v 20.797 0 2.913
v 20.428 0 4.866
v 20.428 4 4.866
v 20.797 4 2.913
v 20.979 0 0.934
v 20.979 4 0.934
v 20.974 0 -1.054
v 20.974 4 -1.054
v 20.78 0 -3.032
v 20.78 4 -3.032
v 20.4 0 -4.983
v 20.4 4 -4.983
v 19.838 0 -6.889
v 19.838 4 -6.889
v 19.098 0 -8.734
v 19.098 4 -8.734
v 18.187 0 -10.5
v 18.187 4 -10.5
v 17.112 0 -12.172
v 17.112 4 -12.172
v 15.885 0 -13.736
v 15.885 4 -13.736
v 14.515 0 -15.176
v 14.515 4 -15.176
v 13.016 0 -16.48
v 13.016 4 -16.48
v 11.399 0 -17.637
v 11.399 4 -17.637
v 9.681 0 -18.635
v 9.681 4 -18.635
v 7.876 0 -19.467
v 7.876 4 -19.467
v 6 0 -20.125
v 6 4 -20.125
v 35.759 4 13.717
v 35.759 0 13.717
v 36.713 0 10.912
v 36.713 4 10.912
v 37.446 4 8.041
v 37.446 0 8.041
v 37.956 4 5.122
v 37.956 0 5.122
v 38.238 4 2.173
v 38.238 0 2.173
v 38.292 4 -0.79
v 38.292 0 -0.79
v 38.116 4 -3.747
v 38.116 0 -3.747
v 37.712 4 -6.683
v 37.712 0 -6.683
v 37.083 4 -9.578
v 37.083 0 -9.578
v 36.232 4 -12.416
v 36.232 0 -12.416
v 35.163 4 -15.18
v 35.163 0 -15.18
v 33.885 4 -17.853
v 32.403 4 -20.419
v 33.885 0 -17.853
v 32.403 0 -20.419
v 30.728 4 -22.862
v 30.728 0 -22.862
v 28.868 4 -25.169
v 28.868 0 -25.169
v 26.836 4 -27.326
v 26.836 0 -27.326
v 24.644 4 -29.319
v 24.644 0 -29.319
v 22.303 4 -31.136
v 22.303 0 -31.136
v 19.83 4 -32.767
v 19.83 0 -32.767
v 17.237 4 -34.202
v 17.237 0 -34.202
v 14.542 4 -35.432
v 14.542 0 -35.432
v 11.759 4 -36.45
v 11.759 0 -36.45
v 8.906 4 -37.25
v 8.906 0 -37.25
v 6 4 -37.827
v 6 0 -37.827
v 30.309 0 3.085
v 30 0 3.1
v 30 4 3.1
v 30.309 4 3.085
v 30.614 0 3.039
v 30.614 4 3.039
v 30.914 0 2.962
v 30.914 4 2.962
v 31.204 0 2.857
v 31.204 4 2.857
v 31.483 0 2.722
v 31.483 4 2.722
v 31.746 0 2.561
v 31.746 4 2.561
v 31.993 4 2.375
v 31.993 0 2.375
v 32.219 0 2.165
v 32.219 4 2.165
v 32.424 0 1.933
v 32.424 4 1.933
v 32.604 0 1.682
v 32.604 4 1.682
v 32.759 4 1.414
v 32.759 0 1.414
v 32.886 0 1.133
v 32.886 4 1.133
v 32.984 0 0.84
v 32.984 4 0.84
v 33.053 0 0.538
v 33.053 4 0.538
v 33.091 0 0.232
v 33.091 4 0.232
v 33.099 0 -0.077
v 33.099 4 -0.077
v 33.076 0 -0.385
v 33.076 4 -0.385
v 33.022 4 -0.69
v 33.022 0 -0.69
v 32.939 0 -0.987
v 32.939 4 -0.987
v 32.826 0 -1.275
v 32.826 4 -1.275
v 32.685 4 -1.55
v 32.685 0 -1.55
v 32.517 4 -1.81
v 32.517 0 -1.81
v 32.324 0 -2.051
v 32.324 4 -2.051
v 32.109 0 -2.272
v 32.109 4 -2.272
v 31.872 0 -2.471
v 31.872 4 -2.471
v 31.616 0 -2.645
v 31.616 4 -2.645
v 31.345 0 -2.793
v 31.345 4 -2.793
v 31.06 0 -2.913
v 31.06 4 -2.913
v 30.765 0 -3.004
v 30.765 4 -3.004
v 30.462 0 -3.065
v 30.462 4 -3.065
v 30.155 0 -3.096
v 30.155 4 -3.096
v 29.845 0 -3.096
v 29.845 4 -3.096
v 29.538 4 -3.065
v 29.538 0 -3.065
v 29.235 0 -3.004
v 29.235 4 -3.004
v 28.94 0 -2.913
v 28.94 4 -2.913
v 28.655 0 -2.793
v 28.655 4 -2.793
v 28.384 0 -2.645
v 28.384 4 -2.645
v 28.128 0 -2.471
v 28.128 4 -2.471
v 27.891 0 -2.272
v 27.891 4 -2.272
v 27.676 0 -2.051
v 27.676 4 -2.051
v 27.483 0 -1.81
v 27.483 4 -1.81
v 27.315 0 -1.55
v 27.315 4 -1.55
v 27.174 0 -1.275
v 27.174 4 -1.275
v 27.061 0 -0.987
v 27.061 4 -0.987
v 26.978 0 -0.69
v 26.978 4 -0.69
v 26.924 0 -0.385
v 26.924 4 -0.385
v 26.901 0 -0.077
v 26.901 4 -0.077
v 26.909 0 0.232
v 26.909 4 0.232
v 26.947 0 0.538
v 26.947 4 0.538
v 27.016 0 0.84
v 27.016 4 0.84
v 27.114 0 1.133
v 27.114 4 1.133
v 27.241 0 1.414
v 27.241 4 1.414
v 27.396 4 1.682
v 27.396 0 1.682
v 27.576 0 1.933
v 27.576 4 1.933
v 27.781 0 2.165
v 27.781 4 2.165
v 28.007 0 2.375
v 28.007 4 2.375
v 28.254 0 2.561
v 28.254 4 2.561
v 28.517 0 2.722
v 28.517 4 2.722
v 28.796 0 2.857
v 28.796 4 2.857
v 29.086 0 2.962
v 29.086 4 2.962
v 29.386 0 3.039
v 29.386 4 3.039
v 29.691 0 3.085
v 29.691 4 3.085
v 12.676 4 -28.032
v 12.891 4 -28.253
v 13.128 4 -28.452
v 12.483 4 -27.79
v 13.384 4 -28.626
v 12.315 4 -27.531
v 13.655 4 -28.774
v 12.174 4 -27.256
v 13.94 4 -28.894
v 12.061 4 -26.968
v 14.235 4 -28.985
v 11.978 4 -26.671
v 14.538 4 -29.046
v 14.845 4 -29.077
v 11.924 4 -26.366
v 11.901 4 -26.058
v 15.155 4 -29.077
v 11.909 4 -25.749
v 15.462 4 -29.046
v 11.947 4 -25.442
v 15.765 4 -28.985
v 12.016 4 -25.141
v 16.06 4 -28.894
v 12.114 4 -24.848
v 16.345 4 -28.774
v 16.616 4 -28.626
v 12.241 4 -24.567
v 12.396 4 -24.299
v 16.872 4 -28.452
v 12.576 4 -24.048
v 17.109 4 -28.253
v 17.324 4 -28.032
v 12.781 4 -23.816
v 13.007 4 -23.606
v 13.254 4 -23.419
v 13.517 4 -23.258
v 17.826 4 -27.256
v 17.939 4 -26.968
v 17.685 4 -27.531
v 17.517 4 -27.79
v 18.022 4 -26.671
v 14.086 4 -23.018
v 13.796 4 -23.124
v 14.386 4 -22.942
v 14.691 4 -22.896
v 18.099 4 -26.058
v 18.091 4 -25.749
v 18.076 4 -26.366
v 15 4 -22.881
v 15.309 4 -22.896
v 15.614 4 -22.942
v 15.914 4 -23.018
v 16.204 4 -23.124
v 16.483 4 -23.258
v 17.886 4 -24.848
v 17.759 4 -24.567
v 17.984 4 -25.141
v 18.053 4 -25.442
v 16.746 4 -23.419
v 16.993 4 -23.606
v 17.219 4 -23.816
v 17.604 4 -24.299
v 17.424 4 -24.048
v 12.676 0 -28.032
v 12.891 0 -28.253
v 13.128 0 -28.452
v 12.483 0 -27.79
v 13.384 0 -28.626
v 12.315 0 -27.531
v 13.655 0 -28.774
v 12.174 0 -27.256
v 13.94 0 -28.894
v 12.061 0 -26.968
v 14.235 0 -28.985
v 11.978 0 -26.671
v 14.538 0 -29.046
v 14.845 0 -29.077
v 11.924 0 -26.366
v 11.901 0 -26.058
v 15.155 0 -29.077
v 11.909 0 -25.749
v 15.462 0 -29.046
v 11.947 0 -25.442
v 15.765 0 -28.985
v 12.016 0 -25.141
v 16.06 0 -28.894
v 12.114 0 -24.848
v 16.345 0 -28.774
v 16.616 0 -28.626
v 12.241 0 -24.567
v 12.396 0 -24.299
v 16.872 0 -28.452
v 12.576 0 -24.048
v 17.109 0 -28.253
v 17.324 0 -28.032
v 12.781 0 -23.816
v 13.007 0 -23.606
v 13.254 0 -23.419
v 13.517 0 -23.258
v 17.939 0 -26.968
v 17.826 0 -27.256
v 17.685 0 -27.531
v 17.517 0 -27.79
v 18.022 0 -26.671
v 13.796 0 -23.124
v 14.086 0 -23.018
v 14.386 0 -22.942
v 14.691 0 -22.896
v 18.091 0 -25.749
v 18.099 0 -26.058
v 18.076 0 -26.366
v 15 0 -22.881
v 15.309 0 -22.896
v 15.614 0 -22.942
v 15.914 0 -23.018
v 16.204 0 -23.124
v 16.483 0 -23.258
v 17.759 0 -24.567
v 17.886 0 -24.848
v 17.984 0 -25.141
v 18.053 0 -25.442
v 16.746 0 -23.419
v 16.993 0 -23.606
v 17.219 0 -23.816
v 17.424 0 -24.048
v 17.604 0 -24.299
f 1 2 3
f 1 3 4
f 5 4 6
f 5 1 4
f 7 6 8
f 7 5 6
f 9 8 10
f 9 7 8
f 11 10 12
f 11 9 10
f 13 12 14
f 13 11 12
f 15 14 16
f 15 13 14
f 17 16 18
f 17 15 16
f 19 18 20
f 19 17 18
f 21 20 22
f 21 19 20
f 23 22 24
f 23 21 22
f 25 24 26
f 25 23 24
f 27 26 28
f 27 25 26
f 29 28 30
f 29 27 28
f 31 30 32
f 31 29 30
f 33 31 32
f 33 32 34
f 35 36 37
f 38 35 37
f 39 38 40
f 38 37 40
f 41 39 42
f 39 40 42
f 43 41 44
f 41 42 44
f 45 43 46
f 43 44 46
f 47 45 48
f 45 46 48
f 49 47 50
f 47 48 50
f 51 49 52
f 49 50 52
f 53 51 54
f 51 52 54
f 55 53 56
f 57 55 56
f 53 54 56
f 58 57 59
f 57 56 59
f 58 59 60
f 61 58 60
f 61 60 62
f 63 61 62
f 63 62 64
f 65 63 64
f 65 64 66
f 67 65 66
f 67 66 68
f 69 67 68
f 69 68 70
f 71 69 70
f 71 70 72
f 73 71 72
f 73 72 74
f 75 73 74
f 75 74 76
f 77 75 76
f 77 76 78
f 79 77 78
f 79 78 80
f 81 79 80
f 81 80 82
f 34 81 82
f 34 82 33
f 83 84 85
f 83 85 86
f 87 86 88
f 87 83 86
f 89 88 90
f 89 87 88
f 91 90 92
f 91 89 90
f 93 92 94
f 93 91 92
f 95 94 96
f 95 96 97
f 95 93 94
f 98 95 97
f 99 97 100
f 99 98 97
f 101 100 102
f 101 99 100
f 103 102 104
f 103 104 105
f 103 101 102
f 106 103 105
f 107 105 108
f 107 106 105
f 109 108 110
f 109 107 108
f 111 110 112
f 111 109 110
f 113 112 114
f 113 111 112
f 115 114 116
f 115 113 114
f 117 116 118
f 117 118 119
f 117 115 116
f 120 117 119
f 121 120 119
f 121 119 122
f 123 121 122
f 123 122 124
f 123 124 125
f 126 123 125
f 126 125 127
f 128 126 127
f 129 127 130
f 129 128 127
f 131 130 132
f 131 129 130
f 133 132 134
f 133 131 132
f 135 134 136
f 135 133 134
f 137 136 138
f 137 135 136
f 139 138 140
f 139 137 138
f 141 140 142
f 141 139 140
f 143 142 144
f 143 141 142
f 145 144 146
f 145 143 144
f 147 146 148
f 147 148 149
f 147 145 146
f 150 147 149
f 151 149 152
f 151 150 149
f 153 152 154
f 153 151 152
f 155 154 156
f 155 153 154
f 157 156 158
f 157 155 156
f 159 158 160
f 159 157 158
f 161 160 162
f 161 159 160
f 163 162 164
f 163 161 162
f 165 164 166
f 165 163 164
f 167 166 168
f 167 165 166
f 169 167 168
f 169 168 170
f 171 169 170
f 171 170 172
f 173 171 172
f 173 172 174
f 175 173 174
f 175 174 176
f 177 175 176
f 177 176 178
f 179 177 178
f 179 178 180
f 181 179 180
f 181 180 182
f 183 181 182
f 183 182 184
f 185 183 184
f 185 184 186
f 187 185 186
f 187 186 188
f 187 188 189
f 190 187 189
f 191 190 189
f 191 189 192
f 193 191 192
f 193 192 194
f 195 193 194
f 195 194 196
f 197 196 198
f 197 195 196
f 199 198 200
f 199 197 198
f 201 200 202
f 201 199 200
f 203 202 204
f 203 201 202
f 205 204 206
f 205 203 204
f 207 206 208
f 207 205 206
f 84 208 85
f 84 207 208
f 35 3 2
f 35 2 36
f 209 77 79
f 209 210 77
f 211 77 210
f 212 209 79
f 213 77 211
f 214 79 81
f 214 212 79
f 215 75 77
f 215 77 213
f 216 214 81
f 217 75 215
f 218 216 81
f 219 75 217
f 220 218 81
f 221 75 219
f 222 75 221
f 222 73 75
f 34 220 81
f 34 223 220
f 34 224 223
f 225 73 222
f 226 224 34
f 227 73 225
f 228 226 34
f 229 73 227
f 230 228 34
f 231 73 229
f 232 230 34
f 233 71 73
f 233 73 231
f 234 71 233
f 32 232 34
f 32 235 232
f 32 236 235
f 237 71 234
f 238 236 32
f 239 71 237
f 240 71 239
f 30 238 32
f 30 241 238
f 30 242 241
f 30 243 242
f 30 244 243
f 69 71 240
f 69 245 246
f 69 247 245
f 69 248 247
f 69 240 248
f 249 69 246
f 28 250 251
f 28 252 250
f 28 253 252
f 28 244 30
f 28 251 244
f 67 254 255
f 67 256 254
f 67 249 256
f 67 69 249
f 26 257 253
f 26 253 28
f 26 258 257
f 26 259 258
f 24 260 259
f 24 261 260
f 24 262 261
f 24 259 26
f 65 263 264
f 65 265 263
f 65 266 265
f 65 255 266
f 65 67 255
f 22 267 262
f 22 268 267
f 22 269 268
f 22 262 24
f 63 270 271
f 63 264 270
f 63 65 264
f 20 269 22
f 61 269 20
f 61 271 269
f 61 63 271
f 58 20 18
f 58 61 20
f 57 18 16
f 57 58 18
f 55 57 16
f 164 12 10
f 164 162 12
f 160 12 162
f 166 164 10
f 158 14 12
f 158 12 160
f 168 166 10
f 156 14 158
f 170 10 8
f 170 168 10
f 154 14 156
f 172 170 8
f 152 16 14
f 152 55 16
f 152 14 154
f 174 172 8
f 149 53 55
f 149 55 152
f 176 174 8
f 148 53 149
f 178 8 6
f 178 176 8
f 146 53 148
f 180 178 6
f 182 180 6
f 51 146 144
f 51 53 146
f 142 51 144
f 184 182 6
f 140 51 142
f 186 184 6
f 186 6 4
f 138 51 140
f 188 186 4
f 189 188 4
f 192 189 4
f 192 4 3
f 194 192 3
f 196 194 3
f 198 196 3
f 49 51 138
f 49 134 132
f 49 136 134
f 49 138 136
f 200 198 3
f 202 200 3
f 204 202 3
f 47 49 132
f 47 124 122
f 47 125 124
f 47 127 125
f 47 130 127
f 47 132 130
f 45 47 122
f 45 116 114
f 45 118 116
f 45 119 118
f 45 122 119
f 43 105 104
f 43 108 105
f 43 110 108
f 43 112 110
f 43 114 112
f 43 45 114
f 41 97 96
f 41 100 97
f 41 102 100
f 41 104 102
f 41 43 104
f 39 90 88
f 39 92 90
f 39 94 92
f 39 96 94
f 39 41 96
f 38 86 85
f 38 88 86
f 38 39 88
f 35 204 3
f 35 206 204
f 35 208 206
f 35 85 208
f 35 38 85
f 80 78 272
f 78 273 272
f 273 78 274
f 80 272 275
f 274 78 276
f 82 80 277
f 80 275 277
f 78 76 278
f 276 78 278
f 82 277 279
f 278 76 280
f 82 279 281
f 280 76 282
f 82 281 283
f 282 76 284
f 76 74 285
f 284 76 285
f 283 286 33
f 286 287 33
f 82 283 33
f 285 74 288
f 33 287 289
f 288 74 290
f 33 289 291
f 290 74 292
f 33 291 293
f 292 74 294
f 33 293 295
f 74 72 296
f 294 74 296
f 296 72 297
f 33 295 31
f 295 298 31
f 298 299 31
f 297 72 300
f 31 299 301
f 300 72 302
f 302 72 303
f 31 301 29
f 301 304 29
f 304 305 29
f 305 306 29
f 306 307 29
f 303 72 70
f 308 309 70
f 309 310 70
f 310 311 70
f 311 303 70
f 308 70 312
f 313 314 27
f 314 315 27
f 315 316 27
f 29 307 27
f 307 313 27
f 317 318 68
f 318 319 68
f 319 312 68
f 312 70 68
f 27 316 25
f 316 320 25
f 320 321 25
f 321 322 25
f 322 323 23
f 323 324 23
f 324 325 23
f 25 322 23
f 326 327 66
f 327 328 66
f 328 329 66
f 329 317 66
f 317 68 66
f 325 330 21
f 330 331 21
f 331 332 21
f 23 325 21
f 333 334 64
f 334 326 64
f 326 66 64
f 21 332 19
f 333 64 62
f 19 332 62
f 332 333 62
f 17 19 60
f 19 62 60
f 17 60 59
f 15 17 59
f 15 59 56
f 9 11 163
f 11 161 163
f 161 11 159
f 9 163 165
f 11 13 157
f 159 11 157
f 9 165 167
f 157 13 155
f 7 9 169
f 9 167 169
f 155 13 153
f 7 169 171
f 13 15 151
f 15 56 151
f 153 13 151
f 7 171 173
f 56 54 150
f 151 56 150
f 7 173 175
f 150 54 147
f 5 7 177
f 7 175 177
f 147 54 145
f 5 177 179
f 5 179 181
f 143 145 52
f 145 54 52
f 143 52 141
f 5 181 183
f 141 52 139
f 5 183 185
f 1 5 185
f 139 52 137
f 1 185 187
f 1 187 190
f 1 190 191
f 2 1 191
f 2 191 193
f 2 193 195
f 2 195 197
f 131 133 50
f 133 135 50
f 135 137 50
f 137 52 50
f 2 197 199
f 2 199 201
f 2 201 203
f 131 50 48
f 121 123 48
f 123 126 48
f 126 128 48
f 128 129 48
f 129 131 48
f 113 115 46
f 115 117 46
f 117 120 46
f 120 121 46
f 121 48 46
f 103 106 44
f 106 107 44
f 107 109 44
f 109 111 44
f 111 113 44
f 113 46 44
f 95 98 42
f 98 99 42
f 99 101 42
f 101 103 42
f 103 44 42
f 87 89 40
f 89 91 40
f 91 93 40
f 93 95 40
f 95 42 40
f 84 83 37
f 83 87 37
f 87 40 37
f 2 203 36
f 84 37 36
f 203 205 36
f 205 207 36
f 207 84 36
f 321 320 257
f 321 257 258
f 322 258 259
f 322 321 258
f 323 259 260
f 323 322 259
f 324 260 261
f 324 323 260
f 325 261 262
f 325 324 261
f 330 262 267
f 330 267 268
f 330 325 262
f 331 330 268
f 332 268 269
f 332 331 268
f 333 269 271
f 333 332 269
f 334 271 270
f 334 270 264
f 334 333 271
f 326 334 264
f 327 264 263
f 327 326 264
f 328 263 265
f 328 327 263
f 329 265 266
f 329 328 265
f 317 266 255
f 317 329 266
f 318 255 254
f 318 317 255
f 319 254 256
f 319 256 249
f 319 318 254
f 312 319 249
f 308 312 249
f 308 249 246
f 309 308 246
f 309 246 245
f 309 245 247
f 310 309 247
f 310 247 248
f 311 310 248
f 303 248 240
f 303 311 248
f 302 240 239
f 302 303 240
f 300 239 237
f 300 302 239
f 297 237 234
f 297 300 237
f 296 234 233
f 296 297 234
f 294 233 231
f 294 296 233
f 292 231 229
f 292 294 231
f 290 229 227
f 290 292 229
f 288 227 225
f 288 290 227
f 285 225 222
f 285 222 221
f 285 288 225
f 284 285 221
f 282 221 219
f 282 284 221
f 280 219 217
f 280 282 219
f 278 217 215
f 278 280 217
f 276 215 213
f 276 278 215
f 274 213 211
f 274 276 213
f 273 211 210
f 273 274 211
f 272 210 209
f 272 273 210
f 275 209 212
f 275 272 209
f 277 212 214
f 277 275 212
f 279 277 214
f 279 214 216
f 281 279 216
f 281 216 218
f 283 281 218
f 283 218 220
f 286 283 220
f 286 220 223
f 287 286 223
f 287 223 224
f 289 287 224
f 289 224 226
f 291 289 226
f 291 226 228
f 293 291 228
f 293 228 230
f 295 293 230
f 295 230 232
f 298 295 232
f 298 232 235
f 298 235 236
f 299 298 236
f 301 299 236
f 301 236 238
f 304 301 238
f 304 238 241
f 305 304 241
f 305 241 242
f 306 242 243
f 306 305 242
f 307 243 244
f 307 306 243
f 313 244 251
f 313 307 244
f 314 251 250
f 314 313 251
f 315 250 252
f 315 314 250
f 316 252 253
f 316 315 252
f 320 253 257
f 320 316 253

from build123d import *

# Parameters (mm, degrees)
SKETCH1_R           = 38.3
SKETCH1_R_2         = 3.1
SKETCH1_R_3         = 21
BOSS_EXTRUDE1_DEPTH = 4
CUT_EXTRUDE1_DEPTH  = 10


with BuildPart() as part:
    # Sketch1 → Boss-Extrude1 (new body)
    with BuildSketch(Plane(origin=(0, 0, 0), x_dir=(1, 0, 0), z_dir=(0, 1, 0))):
        with Locations(Location((0, 0, 0), (0, 0, 270))):
            Circle(SKETCH1_R)
        with Locations(Location((30, 0, 0), (0, 0, 270))):
            Circle(SKETCH1_R_2, mode=Mode.SUBTRACT)
        with Locations(Location((0, 0, 0), (0, 0, 270))):
            Circle(SKETCH1_R_3, mode=Mode.SUBTRACT)
        with Locations(Location((15, -25.980762114, 0), (0, 0, 270))):
            Circle(SKETCH1_R_2, mode=Mode.SUBTRACT)
        with Locations(Location((-15, -25.980762114, 0), (0, 0, 270))):
            Circle(SKETCH1_R_2, mode=Mode.SUBTRACT)
        with Locations(Location((-30, 0, 0), (0, 0, 270))):
            Circle(SKETCH1_R_2, mode=Mode.SUBTRACT)
        with Locations(Location((-15, 25.980762114, 0), (0, 0, 270))):
            Circle(SKETCH1_R_2, mode=Mode.SUBTRACT)
        with Locations(Location((15, 25.980762114, 0), (0, 0, 270))):
            Circle(SKETCH1_R_2, mode=Mode.SUBTRACT)
    extrude(amount=BOSS_EXTRUDE1_DEPTH)

    # Sketch2 → Cut-Extrude1 (cut)
    with BuildSketch(Plane(origin=(0, 4, 0), x_dir=(1, 0, 0), z_dir=(0, 1, 0))):
        with BuildLine():
            Line((6, 50.276302336), (6, 14.297506921))
            ThreePointArc((6, 14.297506921), (13.428105902, 7.752720557), (15.382004204, -1.952601038))
            Line((15.382004204, -1.952601038), (46.540555031, -19.941998745))
            ThreePointArc((46.540555031, -19.941998745), (-43.84951462, -25.31652907), (6, 50.276302336))
        make_face()
    extrude(amount=-CUT_EXTRUDE1_DEPTH, mode=Mode.SUBTRACT)


solid = part.part
